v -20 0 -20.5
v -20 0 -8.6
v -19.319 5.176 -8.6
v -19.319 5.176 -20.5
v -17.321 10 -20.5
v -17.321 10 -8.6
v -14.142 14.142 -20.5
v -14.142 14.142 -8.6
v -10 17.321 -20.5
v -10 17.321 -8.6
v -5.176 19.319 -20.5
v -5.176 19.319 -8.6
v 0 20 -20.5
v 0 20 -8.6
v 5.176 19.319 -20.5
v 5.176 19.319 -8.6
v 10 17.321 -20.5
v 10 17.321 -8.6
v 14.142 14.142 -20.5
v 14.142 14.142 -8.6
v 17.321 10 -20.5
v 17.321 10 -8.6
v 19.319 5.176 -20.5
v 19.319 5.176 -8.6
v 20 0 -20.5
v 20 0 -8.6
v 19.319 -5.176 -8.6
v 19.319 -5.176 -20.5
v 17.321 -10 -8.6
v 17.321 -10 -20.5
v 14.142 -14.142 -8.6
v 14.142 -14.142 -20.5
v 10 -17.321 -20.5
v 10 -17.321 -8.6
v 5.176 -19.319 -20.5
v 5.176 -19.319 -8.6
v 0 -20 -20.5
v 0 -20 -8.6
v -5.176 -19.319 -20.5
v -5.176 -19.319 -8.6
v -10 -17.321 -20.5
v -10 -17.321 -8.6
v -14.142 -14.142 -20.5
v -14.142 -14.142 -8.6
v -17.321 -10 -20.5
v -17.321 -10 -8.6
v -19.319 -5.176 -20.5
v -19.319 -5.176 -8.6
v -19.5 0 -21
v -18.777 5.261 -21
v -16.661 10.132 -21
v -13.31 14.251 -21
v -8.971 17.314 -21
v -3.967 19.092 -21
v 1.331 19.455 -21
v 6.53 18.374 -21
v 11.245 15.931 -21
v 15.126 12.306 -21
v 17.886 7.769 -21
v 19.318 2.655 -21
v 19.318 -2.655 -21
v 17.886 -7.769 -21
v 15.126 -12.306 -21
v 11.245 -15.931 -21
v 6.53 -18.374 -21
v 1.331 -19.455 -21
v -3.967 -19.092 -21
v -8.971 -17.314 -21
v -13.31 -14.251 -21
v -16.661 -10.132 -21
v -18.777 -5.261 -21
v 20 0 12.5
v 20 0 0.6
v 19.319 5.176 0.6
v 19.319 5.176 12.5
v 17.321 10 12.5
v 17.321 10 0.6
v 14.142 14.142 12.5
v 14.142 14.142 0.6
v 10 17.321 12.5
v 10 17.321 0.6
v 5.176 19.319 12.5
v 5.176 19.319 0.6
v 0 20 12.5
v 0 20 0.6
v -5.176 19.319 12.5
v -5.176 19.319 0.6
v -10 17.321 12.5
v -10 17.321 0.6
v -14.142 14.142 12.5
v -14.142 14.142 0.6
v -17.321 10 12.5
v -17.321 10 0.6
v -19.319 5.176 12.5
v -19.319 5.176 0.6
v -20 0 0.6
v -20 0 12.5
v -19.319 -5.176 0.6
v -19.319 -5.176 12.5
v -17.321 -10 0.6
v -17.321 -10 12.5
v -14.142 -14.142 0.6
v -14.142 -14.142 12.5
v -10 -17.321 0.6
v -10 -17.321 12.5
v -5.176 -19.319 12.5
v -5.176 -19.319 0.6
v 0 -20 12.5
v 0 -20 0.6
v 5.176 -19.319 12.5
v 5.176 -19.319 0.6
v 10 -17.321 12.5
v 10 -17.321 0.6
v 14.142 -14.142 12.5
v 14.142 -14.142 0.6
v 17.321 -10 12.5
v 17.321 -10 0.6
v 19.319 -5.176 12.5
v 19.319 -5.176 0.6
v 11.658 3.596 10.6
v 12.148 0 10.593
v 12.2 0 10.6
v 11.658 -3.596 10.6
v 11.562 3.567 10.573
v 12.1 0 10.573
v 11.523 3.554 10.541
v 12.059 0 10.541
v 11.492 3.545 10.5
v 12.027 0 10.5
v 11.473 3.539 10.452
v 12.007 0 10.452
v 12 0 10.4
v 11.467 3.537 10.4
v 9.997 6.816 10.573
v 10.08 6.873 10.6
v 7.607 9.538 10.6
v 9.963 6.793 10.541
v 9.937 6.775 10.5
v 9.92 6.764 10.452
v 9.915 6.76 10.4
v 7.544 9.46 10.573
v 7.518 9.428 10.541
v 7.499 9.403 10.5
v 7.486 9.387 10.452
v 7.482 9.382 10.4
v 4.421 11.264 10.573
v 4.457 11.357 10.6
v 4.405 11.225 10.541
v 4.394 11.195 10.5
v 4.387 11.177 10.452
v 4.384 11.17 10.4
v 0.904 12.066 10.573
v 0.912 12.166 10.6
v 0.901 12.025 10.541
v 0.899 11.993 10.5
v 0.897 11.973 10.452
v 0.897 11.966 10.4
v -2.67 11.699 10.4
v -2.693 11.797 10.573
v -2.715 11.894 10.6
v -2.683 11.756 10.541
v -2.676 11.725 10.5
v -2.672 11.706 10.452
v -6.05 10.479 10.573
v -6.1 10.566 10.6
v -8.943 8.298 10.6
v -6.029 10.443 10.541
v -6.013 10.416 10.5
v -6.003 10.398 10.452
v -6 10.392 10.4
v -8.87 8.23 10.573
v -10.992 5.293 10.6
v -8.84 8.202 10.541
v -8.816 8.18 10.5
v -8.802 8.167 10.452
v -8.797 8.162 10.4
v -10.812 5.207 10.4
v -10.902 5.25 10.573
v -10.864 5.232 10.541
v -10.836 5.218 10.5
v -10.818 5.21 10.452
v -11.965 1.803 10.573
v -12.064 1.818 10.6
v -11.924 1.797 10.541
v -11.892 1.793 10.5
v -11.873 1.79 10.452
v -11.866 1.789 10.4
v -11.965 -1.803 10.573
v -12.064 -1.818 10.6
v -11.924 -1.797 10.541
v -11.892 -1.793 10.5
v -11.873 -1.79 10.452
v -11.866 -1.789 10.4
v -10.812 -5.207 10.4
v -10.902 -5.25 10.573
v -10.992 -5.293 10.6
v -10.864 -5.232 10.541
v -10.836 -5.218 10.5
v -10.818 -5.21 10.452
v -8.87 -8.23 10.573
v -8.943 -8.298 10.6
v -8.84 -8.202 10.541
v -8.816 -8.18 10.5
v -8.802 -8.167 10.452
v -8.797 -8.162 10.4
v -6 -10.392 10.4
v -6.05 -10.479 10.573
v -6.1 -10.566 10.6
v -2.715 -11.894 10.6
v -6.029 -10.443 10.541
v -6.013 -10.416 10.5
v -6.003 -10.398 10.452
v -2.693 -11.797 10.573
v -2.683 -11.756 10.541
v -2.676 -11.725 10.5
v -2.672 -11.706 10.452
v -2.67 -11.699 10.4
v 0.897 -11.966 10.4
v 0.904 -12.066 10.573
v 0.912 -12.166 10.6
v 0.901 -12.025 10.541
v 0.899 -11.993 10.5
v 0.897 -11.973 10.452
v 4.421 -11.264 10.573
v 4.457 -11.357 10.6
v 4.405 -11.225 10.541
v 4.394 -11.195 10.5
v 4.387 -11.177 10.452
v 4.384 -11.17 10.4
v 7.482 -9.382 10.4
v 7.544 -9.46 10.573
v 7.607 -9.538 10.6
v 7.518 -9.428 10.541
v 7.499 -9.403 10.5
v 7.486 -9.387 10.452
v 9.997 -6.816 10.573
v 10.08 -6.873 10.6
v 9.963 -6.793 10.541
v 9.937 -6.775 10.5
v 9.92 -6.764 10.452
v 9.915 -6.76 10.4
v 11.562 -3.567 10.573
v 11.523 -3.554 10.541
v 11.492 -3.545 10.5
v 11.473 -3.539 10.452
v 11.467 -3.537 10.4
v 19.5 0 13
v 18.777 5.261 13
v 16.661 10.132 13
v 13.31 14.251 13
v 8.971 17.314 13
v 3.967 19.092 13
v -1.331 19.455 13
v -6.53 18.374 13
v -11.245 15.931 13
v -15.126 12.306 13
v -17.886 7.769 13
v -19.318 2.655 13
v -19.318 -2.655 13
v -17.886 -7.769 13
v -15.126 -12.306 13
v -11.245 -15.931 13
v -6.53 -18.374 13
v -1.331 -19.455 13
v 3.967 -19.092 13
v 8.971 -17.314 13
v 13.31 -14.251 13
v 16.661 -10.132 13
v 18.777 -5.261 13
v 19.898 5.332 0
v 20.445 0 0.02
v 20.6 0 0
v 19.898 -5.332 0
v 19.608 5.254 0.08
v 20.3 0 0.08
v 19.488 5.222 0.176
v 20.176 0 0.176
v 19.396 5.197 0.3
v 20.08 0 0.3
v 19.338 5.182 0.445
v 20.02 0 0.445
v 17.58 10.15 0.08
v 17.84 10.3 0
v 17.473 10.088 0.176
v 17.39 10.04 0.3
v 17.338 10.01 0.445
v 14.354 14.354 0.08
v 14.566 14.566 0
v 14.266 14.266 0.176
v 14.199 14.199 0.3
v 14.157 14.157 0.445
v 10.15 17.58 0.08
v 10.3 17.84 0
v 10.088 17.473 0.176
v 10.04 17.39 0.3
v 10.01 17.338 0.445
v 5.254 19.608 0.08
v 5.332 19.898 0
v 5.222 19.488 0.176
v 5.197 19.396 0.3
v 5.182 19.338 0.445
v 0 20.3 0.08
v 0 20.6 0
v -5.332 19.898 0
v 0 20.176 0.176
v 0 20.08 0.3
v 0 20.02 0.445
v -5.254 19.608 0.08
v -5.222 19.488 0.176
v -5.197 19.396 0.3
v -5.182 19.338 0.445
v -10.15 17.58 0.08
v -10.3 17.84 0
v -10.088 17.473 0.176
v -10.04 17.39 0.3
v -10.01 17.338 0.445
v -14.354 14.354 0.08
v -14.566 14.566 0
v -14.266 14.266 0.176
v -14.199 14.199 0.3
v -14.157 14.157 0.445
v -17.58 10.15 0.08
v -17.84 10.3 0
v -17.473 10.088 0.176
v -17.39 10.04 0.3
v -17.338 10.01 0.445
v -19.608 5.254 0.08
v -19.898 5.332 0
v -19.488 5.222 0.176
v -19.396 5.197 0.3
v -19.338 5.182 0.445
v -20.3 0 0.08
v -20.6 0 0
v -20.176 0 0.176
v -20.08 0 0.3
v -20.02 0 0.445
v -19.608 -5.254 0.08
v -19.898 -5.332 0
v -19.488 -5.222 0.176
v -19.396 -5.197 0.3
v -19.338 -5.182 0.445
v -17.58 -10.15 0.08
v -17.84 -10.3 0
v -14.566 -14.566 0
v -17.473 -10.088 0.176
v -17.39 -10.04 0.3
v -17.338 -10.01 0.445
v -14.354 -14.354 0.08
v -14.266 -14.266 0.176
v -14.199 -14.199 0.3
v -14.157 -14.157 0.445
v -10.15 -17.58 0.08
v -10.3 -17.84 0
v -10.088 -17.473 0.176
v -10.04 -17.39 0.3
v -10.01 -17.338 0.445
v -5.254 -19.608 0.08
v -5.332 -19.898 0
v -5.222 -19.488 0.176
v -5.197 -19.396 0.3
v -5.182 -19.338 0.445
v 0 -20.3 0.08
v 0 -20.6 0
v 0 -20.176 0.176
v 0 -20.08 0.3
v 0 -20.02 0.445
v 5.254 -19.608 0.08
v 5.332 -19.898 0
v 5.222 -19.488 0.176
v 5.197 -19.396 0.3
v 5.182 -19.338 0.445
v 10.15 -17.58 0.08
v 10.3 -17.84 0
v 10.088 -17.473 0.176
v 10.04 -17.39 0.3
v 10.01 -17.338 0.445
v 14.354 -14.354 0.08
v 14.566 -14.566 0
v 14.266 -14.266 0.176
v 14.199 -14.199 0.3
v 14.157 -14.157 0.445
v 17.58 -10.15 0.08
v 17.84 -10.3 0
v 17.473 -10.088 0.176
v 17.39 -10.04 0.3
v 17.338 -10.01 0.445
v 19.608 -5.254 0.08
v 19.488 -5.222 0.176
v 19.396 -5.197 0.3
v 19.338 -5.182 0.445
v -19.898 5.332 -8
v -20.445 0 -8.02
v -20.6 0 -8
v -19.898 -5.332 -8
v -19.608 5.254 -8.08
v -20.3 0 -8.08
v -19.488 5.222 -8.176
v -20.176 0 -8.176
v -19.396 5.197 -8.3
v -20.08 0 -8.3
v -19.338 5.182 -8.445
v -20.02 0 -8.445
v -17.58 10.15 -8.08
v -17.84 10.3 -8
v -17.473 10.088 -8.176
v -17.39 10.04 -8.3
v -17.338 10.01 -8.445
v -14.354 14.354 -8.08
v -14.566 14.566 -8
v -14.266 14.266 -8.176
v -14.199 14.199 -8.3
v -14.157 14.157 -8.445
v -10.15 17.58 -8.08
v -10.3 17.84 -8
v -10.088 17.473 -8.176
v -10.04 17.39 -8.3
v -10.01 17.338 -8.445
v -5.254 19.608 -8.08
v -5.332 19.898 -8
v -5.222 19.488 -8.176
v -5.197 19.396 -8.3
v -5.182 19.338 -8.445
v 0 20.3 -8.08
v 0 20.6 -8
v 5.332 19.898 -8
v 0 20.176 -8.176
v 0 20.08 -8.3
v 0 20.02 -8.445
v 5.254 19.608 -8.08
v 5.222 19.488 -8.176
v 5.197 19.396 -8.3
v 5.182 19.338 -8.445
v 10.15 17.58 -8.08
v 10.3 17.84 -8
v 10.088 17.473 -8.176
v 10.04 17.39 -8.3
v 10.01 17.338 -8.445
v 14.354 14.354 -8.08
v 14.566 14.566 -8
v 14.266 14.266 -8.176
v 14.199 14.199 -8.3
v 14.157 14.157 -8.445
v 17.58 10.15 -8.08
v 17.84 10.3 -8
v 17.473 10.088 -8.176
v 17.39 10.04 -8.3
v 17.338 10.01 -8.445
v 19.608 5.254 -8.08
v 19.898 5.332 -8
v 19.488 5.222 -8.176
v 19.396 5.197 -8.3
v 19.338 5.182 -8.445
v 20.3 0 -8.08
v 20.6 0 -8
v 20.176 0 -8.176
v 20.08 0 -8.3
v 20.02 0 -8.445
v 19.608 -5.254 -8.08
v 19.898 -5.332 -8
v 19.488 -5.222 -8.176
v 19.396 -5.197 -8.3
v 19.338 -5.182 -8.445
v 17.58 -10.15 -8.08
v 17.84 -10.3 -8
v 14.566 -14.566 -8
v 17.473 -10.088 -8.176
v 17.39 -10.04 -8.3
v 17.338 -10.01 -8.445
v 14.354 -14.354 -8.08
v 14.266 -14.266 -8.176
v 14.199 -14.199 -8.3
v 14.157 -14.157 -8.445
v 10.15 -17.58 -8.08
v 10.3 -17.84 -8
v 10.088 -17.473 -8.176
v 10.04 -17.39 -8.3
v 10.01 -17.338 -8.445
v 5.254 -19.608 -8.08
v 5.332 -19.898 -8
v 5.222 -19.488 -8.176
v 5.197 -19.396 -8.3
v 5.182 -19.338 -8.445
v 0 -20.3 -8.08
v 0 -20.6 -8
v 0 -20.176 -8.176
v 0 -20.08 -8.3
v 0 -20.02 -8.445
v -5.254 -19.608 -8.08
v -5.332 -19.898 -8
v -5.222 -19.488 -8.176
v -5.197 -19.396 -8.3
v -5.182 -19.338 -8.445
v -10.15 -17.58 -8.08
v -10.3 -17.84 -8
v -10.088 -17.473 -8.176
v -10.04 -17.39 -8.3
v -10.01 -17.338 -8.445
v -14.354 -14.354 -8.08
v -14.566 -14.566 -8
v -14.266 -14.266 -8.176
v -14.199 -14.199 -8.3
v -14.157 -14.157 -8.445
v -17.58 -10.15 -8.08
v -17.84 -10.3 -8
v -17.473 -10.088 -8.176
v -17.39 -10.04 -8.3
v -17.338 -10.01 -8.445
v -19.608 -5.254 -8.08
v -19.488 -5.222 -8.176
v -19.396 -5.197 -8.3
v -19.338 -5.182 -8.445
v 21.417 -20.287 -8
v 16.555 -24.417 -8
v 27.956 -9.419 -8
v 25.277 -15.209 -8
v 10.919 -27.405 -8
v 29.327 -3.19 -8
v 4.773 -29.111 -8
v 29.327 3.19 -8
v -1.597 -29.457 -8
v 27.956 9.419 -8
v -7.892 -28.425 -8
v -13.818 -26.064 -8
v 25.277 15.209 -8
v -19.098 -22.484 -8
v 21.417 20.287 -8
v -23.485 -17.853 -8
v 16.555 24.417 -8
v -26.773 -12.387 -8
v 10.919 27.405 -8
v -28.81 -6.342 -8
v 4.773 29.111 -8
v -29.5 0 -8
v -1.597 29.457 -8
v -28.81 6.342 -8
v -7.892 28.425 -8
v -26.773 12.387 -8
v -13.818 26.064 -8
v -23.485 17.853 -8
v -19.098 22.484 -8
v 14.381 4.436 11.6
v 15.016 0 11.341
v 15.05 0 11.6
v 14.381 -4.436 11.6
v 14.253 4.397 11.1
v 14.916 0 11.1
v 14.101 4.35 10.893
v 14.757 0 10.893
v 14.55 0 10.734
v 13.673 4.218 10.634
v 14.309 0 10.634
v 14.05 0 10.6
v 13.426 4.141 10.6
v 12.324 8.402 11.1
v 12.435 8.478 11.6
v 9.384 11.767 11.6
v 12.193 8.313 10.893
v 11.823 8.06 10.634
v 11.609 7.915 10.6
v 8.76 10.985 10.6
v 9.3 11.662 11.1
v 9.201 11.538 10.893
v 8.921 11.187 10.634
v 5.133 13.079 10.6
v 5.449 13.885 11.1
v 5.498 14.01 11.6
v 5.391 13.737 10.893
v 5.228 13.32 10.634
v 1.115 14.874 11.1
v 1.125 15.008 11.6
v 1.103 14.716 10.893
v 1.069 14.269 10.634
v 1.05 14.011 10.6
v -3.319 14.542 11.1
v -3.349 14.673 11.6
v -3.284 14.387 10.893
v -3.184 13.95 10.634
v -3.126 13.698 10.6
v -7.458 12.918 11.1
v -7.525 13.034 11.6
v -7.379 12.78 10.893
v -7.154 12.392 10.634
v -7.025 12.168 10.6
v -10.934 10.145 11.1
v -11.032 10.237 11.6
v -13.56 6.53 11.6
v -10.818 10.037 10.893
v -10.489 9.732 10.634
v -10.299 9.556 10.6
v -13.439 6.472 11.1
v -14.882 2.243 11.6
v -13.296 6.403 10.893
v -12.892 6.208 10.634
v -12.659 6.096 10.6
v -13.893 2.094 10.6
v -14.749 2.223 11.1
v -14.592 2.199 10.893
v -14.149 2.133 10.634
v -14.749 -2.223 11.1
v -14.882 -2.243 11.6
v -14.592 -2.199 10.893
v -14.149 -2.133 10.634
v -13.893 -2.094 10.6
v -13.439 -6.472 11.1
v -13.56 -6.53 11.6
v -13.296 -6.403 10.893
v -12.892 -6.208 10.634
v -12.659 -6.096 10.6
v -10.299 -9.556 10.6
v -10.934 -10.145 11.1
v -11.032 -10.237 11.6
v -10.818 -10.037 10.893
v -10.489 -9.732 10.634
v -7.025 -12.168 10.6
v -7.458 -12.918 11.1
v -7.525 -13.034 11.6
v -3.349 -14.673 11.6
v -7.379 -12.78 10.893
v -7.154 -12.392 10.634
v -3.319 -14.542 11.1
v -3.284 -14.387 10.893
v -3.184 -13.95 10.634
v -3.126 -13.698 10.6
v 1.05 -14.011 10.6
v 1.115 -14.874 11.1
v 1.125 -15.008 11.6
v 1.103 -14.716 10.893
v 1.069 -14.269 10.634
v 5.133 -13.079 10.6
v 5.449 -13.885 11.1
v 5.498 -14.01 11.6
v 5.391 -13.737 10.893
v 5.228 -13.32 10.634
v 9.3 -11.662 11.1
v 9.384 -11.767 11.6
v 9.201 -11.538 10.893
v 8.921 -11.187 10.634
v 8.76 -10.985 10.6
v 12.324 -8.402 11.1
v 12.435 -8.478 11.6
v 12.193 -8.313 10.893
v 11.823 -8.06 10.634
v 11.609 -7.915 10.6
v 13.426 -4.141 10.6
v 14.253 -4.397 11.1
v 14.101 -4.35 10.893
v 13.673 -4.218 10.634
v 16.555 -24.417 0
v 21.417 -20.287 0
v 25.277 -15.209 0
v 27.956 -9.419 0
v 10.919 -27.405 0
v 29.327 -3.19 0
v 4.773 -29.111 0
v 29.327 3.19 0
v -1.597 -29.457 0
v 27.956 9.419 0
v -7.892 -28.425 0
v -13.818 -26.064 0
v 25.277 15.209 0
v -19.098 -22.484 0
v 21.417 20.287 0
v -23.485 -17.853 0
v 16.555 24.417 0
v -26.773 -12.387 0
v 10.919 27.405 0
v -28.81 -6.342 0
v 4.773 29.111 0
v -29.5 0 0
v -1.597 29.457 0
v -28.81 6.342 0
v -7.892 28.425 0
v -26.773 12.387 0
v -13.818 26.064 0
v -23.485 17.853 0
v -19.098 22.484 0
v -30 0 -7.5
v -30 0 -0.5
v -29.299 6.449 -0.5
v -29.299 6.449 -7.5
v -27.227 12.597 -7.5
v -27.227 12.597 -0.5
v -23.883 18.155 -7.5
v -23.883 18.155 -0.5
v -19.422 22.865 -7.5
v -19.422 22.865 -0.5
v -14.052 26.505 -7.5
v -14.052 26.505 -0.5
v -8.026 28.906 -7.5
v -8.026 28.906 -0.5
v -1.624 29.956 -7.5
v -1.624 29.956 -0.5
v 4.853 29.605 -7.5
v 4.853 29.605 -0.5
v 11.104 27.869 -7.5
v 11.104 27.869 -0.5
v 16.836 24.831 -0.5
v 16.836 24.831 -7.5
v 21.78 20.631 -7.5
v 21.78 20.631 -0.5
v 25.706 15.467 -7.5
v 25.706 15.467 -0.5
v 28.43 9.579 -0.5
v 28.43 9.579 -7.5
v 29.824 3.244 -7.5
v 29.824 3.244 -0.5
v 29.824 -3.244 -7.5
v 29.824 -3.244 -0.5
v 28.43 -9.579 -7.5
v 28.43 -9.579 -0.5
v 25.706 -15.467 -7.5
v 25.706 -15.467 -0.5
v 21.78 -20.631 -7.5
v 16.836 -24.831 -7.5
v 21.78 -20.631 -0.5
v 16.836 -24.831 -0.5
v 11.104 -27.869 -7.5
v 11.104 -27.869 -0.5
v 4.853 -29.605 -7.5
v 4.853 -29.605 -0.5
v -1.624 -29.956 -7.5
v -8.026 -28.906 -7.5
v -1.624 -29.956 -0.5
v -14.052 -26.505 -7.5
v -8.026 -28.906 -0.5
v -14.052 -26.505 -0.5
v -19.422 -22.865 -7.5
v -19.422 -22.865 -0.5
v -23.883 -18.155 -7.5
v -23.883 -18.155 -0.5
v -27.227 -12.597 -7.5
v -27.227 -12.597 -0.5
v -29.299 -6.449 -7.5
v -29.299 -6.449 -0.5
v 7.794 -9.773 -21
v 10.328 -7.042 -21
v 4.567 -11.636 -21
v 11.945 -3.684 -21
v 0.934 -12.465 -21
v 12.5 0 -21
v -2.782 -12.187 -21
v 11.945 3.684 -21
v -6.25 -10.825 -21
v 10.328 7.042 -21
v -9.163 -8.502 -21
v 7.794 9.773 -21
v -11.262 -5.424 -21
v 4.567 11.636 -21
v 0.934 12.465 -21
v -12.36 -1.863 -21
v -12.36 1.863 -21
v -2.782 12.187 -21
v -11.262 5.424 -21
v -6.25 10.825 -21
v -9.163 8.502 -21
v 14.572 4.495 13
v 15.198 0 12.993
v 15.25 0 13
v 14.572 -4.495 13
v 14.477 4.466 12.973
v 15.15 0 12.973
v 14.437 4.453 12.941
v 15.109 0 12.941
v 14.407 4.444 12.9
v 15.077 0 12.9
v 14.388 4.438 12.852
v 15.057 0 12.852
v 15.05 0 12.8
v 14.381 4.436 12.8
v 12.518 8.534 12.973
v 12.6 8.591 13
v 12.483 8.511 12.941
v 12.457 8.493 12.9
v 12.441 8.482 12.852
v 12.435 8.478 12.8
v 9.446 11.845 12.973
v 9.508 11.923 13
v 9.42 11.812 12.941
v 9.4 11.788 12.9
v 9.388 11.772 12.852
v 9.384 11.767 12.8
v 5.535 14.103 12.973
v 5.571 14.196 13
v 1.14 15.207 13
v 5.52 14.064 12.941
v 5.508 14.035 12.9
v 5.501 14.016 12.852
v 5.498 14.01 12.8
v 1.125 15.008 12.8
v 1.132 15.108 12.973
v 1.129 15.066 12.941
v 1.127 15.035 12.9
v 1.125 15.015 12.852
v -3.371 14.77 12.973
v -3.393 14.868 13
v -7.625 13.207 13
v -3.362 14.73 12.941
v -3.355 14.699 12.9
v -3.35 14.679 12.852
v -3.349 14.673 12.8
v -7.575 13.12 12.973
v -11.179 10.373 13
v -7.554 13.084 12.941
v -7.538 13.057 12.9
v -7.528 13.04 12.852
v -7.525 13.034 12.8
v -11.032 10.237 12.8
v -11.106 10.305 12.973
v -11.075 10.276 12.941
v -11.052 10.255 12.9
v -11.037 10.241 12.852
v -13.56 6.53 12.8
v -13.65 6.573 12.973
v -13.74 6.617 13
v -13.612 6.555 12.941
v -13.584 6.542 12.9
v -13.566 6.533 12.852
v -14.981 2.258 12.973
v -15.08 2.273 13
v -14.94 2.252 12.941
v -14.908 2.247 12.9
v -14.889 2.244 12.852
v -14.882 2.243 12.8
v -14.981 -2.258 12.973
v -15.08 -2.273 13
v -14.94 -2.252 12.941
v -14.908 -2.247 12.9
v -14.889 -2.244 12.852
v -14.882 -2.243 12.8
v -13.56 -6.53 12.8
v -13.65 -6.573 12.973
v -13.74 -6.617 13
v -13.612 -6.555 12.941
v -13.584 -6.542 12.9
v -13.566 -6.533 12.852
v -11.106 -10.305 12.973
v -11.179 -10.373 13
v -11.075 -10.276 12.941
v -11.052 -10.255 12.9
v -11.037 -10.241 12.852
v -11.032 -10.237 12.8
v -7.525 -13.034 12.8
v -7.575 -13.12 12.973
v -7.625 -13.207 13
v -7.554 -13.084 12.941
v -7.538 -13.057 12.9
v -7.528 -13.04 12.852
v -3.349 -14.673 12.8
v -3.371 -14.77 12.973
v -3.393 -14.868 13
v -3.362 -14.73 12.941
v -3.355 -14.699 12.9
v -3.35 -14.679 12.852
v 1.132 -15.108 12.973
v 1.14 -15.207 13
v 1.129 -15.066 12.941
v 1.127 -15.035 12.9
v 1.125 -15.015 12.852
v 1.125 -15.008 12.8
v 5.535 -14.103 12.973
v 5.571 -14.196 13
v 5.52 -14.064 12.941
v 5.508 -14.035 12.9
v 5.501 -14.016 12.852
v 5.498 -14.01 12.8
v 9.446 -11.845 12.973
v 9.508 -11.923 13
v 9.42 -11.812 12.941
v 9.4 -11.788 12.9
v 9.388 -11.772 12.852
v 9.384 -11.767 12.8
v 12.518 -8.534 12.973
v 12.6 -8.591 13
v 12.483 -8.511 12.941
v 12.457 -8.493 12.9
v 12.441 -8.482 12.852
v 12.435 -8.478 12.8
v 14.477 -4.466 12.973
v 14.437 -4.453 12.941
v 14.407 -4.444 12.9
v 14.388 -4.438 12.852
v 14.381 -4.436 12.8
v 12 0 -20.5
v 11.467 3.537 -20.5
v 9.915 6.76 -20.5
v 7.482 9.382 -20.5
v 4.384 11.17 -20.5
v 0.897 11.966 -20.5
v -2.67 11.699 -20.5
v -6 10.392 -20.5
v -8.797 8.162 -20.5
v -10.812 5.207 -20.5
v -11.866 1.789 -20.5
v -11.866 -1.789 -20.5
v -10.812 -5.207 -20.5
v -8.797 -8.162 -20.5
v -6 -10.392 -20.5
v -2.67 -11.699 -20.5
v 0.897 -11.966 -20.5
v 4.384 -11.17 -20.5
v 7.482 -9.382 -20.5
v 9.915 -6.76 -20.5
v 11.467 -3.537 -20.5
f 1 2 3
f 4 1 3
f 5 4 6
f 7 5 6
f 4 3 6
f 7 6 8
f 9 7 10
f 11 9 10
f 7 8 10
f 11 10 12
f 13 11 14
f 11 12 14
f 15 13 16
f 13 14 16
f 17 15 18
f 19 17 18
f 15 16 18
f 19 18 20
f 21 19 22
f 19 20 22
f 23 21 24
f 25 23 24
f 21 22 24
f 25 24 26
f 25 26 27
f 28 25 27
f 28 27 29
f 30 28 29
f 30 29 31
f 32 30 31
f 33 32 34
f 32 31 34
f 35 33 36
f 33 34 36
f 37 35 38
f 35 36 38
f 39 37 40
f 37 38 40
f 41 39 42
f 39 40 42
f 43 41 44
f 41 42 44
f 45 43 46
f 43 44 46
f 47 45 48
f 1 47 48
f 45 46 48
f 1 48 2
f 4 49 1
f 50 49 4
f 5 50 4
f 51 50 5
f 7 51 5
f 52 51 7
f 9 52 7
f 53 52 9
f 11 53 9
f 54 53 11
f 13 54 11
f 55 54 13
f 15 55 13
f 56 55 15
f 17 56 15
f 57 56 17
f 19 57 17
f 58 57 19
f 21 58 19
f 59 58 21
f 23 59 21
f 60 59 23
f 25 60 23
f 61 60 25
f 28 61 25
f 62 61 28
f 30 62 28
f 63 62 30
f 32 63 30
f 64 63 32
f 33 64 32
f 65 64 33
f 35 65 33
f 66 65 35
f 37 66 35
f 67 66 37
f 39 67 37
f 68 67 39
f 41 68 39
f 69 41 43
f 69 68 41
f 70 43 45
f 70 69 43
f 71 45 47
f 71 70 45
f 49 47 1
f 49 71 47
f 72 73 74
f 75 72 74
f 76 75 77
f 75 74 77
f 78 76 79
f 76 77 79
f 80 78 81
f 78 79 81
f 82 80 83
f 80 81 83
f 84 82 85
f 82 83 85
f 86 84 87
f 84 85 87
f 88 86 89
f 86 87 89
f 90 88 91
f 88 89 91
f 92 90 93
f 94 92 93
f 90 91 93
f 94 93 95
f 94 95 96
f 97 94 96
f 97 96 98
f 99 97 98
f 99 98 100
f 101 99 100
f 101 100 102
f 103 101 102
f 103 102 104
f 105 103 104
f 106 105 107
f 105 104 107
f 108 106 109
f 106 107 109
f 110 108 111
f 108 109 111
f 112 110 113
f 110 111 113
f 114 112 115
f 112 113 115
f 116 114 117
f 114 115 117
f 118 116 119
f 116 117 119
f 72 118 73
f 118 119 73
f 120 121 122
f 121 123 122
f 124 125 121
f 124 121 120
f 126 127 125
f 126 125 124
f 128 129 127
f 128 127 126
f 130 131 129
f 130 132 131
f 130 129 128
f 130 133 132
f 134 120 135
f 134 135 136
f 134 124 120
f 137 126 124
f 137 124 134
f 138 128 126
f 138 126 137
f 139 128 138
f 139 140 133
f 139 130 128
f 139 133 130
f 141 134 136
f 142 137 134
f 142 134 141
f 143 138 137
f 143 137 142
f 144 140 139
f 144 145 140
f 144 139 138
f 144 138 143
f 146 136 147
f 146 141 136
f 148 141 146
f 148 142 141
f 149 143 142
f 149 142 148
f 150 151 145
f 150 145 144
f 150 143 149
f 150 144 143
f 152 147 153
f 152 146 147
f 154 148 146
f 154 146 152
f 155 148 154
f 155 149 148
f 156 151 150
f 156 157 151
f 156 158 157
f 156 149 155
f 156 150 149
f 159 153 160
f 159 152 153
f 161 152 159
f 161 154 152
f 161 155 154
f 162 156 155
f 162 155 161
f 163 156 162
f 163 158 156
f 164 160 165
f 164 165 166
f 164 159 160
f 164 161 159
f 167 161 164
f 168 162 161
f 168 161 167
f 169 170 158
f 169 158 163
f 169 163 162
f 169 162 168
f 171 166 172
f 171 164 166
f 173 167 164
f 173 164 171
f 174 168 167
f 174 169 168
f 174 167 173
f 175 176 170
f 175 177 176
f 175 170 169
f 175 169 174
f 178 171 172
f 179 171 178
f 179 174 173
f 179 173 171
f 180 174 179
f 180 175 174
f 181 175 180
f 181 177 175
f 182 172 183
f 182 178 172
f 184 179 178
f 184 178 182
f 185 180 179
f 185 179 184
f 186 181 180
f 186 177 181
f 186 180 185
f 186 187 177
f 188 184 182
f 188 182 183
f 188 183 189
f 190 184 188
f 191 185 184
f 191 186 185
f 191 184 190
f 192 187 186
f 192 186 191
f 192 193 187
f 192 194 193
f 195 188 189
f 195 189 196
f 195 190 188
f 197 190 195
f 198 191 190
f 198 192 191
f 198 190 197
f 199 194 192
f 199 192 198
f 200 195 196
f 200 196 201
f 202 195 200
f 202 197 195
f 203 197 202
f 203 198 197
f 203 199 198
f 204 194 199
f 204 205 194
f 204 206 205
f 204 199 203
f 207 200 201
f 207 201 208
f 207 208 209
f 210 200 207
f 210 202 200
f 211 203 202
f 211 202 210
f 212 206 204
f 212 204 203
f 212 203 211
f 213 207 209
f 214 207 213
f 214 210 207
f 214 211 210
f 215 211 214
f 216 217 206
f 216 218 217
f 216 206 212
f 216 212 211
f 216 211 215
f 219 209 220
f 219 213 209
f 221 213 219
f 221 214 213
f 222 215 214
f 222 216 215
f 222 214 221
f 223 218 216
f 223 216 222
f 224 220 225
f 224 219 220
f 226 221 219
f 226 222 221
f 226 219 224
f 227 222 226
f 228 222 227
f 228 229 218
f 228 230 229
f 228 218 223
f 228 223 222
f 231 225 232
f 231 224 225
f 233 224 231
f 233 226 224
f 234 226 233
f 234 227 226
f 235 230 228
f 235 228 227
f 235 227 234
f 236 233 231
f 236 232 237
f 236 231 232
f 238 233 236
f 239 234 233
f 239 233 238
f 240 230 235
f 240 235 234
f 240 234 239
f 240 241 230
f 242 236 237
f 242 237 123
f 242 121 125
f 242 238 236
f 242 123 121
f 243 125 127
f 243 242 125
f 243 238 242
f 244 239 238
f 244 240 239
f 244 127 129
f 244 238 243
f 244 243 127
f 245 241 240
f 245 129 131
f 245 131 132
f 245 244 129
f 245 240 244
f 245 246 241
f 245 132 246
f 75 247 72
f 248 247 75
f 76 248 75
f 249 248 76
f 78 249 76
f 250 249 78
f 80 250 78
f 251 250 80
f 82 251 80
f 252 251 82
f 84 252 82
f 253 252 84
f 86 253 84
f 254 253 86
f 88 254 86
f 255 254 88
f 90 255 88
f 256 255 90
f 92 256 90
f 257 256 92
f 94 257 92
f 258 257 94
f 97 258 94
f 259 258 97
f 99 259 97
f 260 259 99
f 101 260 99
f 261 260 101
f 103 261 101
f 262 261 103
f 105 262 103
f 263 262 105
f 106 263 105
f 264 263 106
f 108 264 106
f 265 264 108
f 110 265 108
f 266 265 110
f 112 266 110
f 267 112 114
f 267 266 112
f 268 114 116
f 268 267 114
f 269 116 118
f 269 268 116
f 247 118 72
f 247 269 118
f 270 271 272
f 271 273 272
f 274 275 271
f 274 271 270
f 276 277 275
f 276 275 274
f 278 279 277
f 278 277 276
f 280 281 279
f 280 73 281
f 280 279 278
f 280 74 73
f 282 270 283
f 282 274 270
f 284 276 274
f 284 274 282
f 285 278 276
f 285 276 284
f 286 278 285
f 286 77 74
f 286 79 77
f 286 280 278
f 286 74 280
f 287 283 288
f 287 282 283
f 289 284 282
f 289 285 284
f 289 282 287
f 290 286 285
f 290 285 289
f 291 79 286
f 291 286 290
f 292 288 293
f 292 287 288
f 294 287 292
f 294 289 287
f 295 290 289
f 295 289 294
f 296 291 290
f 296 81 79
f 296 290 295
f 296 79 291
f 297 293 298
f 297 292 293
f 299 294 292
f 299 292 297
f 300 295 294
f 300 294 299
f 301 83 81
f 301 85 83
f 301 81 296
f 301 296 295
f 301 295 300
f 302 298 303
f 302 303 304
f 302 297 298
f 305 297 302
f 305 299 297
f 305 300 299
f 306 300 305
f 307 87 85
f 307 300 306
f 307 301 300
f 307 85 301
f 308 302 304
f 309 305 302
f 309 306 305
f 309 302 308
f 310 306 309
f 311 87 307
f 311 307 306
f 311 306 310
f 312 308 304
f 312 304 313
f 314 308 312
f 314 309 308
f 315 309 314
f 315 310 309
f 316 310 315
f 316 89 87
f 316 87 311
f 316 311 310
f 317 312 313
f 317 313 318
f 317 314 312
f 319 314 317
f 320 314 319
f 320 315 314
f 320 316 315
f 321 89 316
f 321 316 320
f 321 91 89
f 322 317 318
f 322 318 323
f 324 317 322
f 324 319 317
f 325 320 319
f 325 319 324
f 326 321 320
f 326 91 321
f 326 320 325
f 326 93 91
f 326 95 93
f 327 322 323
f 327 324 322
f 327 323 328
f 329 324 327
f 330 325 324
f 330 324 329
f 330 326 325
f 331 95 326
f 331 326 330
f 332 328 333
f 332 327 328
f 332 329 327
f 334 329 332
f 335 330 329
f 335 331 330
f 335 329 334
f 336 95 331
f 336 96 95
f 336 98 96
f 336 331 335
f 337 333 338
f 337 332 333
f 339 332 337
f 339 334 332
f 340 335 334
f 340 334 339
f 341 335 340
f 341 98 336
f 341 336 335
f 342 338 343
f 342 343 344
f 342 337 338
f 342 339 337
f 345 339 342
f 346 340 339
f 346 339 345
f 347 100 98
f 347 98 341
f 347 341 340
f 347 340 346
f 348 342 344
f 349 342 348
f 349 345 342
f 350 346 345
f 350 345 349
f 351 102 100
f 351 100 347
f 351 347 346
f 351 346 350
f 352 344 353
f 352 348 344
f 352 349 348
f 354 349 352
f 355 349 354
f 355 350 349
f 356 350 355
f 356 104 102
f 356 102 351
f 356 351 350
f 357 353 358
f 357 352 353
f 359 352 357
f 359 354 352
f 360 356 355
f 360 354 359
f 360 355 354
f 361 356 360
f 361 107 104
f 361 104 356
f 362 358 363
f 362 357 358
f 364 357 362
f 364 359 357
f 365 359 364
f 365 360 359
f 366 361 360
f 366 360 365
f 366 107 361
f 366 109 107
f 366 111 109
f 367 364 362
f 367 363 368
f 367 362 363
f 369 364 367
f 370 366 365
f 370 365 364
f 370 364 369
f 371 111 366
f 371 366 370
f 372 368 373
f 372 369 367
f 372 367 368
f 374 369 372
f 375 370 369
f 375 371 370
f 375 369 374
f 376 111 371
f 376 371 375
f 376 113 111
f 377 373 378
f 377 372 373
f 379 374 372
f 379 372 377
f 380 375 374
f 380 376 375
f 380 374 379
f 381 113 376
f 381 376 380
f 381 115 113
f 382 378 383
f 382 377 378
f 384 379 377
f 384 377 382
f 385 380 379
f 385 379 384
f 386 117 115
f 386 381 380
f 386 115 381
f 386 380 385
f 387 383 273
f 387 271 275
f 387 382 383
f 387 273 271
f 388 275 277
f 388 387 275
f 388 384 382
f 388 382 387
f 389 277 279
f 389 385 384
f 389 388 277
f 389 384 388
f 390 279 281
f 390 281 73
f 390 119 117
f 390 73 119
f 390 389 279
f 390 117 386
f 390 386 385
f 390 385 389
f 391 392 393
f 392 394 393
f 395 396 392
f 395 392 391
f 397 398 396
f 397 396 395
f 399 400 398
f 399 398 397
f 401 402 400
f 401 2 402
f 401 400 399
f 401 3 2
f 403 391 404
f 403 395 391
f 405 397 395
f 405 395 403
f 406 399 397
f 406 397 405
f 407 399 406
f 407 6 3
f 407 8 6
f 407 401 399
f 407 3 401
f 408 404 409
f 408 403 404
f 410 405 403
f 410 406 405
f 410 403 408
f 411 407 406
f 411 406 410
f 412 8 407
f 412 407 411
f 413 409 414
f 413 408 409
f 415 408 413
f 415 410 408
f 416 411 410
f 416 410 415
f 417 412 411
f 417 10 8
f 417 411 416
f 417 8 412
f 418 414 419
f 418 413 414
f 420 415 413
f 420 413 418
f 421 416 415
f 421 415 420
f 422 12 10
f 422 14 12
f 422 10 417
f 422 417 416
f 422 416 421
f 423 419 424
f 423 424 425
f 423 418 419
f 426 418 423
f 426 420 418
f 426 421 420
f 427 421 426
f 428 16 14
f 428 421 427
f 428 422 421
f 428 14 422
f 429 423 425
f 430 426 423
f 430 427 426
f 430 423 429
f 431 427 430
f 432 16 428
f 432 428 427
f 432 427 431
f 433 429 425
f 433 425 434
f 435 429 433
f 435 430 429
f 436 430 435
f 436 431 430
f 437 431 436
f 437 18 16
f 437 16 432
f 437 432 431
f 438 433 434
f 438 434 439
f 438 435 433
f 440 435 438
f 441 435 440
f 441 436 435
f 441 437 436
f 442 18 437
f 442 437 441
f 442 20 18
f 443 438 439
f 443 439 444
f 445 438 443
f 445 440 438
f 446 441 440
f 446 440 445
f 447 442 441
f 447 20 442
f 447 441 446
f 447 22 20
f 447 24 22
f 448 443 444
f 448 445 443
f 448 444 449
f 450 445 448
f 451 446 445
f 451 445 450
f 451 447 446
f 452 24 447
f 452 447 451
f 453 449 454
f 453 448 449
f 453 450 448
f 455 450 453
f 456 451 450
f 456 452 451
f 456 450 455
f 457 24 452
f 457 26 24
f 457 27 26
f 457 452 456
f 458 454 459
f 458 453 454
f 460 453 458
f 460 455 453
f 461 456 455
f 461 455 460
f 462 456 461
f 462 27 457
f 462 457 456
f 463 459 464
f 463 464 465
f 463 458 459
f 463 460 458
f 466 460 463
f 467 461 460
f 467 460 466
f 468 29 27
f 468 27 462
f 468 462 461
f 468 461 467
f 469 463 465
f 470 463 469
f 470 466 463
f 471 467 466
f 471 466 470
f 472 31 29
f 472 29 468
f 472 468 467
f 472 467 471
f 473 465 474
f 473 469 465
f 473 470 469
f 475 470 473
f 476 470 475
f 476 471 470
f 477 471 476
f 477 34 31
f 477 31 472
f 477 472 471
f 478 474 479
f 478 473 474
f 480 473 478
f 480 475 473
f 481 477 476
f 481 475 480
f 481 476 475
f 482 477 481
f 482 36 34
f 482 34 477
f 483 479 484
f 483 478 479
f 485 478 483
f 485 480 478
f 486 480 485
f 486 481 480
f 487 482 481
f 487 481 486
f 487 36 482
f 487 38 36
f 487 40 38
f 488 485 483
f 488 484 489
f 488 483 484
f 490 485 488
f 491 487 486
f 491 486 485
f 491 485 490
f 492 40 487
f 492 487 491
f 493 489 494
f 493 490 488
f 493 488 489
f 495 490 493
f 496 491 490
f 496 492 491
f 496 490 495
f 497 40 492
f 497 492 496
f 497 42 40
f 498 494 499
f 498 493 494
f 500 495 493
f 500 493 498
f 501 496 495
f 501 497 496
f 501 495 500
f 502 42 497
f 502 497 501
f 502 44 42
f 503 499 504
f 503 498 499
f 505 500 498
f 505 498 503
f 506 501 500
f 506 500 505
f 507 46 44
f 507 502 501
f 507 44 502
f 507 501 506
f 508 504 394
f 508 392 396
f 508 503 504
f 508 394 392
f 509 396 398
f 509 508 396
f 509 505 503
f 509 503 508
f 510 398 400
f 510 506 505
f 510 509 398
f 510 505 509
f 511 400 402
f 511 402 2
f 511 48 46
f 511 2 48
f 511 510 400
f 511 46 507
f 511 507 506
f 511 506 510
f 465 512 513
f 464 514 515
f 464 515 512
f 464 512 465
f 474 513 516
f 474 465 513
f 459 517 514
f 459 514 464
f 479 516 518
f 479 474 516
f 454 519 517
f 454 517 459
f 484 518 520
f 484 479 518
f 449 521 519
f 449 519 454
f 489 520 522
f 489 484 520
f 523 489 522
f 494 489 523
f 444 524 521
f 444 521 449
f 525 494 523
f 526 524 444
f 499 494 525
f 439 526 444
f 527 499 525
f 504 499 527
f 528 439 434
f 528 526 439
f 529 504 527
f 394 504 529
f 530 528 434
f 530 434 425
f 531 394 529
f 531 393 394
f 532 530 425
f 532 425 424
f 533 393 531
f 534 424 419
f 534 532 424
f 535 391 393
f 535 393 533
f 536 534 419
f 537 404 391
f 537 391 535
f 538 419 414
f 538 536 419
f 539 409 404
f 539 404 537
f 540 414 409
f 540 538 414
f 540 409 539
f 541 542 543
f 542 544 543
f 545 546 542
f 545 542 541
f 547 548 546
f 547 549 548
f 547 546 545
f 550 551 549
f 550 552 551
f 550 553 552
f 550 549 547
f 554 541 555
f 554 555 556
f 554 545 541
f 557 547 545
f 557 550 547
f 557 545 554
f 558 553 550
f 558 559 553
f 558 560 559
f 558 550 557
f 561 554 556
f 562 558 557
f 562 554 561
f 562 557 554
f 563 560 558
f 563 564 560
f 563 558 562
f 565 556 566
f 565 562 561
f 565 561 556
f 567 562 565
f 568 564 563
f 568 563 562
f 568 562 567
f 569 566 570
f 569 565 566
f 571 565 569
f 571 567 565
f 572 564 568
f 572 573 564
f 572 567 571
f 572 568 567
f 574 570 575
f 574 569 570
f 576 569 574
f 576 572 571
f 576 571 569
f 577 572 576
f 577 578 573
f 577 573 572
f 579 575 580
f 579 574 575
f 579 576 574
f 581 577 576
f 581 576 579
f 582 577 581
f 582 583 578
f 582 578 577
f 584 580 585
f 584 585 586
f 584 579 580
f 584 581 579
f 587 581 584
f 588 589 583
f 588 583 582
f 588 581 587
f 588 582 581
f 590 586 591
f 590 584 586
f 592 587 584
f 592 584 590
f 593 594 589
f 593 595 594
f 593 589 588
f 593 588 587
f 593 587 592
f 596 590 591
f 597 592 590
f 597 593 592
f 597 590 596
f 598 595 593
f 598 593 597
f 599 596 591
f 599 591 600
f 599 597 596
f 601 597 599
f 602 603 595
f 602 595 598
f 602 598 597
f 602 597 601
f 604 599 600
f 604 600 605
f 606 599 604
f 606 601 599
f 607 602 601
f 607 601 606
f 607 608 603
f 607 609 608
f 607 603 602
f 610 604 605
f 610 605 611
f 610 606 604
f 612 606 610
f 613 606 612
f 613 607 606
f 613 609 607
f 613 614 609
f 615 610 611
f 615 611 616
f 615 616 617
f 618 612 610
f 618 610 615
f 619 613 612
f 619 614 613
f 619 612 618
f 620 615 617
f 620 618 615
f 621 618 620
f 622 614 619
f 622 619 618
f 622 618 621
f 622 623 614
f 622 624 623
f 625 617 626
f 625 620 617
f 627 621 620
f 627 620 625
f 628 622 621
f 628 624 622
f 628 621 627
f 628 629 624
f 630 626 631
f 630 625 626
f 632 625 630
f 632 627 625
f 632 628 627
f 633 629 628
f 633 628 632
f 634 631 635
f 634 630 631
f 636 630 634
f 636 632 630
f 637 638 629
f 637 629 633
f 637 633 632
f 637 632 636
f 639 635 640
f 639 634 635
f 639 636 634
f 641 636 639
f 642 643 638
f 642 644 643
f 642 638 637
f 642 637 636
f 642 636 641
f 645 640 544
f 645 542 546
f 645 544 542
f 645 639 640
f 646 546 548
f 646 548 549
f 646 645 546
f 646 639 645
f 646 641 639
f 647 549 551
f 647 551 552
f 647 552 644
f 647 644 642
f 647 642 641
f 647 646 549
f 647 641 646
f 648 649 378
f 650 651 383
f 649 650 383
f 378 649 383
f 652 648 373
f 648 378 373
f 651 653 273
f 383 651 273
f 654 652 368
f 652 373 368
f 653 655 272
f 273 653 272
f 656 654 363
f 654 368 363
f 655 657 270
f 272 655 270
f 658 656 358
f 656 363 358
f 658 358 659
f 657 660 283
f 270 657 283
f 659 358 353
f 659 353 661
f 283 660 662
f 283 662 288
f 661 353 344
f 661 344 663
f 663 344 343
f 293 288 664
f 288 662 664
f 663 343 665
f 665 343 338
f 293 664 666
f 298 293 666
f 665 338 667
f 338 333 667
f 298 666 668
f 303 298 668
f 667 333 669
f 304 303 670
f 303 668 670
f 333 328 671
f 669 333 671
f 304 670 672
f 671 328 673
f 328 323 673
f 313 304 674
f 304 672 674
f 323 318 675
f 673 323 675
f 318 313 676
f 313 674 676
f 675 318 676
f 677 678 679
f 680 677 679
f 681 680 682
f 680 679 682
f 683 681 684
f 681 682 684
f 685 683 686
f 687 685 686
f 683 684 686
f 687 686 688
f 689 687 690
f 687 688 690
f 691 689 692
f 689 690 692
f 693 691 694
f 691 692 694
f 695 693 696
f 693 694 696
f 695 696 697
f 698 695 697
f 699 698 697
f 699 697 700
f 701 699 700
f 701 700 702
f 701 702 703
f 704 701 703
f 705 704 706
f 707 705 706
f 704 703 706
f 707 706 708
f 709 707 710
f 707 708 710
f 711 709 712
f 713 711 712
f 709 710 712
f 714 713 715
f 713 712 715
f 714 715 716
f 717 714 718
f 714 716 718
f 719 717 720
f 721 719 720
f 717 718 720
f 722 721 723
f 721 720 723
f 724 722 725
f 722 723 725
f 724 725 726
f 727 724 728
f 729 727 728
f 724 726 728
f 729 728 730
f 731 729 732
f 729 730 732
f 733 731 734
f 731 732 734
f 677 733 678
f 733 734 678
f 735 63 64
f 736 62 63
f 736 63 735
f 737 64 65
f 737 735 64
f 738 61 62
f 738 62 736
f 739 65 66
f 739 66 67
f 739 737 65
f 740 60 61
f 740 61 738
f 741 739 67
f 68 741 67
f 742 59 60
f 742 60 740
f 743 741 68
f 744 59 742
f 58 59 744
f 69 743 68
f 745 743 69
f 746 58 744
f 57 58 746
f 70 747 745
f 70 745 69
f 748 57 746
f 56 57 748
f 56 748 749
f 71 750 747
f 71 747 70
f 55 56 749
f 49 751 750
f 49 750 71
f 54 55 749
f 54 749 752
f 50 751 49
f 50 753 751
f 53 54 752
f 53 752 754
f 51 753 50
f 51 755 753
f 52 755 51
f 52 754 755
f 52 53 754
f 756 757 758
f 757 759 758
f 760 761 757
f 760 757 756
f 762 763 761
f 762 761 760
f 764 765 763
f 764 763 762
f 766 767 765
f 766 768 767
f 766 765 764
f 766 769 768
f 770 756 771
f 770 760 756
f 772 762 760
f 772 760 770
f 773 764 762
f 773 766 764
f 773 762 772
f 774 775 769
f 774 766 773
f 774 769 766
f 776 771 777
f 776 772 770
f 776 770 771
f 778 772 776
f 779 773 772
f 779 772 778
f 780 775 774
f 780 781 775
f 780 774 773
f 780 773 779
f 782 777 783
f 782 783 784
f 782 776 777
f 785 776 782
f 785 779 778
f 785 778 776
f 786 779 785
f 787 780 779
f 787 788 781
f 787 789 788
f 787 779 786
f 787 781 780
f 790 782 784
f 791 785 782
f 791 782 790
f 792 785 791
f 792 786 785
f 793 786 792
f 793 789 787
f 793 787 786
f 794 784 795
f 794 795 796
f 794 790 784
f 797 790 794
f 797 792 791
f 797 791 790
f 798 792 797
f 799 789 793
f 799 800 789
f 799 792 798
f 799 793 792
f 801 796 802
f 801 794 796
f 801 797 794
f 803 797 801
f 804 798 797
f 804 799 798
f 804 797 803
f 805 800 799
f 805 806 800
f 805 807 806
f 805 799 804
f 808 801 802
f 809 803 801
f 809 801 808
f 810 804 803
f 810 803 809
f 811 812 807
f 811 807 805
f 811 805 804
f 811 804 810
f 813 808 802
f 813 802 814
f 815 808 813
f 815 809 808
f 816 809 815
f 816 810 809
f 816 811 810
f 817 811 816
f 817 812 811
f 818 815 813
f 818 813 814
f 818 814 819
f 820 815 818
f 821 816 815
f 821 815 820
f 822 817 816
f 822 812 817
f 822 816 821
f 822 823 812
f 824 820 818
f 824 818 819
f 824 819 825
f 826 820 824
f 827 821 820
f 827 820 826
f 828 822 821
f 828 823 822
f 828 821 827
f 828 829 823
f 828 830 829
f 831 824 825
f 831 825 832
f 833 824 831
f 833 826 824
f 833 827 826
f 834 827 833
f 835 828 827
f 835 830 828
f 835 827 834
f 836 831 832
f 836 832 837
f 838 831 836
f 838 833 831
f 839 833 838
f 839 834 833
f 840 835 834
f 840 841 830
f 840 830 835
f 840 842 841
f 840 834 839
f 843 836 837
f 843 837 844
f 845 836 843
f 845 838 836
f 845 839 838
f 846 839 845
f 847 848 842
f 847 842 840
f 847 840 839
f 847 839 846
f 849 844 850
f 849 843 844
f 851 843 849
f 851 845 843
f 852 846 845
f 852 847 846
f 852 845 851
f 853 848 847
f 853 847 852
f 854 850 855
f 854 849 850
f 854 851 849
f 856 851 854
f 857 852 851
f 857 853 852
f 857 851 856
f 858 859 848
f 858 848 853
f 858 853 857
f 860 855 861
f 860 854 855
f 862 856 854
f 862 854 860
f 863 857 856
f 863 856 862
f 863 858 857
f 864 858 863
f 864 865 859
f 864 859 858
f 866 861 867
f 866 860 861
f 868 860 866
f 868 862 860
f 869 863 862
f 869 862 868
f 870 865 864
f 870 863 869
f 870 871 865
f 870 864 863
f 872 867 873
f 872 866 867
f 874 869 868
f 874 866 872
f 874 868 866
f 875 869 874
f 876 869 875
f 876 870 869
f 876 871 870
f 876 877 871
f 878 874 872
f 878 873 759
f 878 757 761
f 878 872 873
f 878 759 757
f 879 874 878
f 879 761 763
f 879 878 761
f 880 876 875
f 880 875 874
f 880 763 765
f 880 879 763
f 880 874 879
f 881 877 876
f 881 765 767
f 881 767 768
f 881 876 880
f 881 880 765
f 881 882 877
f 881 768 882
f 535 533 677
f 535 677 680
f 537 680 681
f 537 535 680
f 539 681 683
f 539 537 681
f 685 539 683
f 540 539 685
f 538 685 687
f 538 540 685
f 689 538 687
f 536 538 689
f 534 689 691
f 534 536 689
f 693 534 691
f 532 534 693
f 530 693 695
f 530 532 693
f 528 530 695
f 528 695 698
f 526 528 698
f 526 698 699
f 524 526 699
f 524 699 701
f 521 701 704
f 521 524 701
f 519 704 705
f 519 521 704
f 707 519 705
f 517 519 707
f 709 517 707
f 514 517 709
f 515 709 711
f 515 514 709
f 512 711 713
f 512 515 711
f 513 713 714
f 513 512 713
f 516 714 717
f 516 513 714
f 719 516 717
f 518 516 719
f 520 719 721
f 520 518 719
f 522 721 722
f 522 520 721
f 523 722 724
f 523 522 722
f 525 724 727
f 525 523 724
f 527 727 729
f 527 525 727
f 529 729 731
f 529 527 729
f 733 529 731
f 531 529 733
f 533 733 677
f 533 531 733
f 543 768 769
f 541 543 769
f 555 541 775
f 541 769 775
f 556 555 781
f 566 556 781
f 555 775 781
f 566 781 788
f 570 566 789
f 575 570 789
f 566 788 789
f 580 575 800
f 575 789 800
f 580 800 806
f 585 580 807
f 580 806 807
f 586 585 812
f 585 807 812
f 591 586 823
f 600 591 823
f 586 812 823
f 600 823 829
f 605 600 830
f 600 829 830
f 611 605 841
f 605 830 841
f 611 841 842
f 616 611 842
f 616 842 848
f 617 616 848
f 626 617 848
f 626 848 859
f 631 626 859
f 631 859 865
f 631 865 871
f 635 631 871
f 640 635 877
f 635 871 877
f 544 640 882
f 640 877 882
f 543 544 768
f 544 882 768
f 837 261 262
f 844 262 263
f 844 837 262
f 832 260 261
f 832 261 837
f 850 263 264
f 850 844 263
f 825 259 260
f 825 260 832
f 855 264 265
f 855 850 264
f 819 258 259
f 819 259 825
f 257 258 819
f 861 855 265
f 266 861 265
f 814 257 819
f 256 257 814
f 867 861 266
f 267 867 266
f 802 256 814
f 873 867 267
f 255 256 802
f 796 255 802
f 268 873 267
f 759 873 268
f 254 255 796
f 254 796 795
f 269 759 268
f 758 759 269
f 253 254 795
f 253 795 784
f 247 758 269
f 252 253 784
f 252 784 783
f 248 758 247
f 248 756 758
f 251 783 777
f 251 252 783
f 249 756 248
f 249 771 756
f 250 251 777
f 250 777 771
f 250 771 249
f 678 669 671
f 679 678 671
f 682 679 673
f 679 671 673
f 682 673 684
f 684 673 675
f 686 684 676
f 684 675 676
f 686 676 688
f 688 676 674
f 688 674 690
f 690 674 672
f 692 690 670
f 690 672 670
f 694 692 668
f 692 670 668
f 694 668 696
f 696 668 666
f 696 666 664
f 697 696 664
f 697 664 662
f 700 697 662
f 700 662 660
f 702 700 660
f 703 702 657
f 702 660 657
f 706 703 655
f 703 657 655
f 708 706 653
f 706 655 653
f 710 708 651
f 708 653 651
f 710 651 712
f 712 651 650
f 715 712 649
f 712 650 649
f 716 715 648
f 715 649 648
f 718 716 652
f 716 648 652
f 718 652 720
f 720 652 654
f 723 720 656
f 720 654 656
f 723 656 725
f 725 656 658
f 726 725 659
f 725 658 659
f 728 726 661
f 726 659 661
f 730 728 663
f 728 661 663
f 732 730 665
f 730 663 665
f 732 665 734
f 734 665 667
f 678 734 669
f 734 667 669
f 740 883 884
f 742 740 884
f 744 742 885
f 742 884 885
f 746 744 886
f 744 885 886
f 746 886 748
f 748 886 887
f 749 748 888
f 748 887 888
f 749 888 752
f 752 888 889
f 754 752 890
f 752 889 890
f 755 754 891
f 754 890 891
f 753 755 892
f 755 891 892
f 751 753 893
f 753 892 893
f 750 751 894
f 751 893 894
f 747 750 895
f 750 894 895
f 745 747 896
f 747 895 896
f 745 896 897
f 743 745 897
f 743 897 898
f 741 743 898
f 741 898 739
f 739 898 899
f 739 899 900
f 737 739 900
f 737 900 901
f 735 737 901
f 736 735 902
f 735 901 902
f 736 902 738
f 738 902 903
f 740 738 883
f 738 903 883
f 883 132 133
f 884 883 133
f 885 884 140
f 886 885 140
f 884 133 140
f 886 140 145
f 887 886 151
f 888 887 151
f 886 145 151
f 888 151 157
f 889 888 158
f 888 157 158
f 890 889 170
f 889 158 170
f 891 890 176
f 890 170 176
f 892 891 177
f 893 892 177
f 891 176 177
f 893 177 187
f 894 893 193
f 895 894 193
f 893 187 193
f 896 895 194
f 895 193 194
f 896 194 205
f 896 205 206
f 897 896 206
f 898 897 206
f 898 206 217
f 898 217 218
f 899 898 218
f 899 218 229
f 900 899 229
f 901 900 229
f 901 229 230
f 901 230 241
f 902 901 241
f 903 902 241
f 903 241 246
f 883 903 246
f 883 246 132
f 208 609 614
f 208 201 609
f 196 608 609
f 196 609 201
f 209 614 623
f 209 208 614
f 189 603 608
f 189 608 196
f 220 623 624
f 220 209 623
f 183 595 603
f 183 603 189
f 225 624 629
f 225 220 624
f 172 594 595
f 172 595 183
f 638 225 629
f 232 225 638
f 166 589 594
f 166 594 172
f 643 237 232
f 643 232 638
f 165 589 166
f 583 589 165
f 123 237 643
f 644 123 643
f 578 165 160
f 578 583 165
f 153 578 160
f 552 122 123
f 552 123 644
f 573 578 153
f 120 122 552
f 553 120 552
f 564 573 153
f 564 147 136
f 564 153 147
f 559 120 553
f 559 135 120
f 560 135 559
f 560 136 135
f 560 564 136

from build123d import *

# Parameters (mm, degrees)
SKETCH1_R           = 20
BOSS_EXTRUDE1_DEPTH = 13
SKETCH2_R           = 30
BOSS_EXTRUDE2_DEPTH = 8
BOSS_EXTRUDE3_START = 13
SKETCH3_R           = 20
BOSS_EXTRUDE3_DEPTH = 13
CUT_EXTRUDE1_REACH  = 56.369
SKETCH4_R           = 12
SKETCH5_R           = 15.05
CUT_EXTRUDE2_DEPTH  = 2.4
CHAMFER1_SIZE       = 0.5
FILLET1_R           = 0.6
FILLET2_R           = 0.2
FILLET3_R           = 1


with BuildPart() as part:
    # Sketch1 → Boss-Extrude1 (new body)
    with BuildSketch(Plane.XY):
        Circle(SKETCH1_R)
    extrude(amount=BOSS_EXTRUDE1_DEPTH)

    # Sketch2 → Boss-Extrude2 (add)
    with BuildSketch(Plane(origin=(0, 0, 0), x_dir=(-1, 0, 0), z_dir=(0, 0, -1))):
        Circle(SKETCH2_R)
    extrude(amount=BOSS_EXTRUDE2_DEPTH)

    # Sketch3 → Boss-Extrude3 (add)
    with BuildSketch(Plane(origin=(0, 0, -8), x_dir=(-1, 0, 0), z_dir=(0, 0, -1)).offset(BOSS_EXTRUDE3_START)):
        Circle(SKETCH3_R)
    extrude(amount=-BOSS_EXTRUDE3_DEPTH)

    # Sketch4 → Cut-Extrude1 (cut, up to next)
    with BuildSketch(Plane.XY.offset(13), mode=Mode.PRIVATE) as cut_extrude1_sk1:
        Circle(SKETCH4_R)
    cut_extrude1_tool1 = extrude(cut_extrude1_sk1.sketch, amount=-CUT_EXTRUDE1_REACH, mode=Mode.PRIVATE) & part.part
    add(cut_extrude1_tool1.solids().sort_by_distance((0, 0, 13))[0], mode=Mode.SUBTRACT)

    # Sketch5 → Cut-Extrude2 (cut)
    with BuildSketch(Plane.XY.offset(13)):
        Circle(SKETCH5_R)
    extrude(amount=-CUT_EXTRUDE2_DEPTH, mode=Mode.SUBTRACT)

    # Chamfer1
    chamfer1_edges = [part.edges().sort_by_distance(p)[0] for p in [
        (-12, 0, -21),
        (20, 0, -21),
        (30, 0, -8),
        (30, 0, 0),
        (-20, 0, 13),
    ]]
    chamfer(chamfer1_edges, length=CHAMFER1_SIZE)

    # Fillet1
    fillet1_edges = [part.edges().sort_by_distance(p)[0] for p in [
        (-20, 0, 0),
        (20, 0, -8),
    ]]
    fillet(fillet1_edges, radius=FILLET1_R)

    # Fillet2
    fillet2_edges = [part.edges().sort_by_distance(p)[0] for p in [
        (-15.05, 0, 13),
        (-12, 0, 10.6),
    ]]
    fillet(fillet2_edges, radius=FILLET2_R)

    # Fillet3
    fillet3_edges = [part.edges().sort_by_distance(p)[0] for p in [
        (-15.05, 0, 10.6),
    ]]
    fillet(fillet3_edges, radius=FILLET3_R)


solid = part.part
